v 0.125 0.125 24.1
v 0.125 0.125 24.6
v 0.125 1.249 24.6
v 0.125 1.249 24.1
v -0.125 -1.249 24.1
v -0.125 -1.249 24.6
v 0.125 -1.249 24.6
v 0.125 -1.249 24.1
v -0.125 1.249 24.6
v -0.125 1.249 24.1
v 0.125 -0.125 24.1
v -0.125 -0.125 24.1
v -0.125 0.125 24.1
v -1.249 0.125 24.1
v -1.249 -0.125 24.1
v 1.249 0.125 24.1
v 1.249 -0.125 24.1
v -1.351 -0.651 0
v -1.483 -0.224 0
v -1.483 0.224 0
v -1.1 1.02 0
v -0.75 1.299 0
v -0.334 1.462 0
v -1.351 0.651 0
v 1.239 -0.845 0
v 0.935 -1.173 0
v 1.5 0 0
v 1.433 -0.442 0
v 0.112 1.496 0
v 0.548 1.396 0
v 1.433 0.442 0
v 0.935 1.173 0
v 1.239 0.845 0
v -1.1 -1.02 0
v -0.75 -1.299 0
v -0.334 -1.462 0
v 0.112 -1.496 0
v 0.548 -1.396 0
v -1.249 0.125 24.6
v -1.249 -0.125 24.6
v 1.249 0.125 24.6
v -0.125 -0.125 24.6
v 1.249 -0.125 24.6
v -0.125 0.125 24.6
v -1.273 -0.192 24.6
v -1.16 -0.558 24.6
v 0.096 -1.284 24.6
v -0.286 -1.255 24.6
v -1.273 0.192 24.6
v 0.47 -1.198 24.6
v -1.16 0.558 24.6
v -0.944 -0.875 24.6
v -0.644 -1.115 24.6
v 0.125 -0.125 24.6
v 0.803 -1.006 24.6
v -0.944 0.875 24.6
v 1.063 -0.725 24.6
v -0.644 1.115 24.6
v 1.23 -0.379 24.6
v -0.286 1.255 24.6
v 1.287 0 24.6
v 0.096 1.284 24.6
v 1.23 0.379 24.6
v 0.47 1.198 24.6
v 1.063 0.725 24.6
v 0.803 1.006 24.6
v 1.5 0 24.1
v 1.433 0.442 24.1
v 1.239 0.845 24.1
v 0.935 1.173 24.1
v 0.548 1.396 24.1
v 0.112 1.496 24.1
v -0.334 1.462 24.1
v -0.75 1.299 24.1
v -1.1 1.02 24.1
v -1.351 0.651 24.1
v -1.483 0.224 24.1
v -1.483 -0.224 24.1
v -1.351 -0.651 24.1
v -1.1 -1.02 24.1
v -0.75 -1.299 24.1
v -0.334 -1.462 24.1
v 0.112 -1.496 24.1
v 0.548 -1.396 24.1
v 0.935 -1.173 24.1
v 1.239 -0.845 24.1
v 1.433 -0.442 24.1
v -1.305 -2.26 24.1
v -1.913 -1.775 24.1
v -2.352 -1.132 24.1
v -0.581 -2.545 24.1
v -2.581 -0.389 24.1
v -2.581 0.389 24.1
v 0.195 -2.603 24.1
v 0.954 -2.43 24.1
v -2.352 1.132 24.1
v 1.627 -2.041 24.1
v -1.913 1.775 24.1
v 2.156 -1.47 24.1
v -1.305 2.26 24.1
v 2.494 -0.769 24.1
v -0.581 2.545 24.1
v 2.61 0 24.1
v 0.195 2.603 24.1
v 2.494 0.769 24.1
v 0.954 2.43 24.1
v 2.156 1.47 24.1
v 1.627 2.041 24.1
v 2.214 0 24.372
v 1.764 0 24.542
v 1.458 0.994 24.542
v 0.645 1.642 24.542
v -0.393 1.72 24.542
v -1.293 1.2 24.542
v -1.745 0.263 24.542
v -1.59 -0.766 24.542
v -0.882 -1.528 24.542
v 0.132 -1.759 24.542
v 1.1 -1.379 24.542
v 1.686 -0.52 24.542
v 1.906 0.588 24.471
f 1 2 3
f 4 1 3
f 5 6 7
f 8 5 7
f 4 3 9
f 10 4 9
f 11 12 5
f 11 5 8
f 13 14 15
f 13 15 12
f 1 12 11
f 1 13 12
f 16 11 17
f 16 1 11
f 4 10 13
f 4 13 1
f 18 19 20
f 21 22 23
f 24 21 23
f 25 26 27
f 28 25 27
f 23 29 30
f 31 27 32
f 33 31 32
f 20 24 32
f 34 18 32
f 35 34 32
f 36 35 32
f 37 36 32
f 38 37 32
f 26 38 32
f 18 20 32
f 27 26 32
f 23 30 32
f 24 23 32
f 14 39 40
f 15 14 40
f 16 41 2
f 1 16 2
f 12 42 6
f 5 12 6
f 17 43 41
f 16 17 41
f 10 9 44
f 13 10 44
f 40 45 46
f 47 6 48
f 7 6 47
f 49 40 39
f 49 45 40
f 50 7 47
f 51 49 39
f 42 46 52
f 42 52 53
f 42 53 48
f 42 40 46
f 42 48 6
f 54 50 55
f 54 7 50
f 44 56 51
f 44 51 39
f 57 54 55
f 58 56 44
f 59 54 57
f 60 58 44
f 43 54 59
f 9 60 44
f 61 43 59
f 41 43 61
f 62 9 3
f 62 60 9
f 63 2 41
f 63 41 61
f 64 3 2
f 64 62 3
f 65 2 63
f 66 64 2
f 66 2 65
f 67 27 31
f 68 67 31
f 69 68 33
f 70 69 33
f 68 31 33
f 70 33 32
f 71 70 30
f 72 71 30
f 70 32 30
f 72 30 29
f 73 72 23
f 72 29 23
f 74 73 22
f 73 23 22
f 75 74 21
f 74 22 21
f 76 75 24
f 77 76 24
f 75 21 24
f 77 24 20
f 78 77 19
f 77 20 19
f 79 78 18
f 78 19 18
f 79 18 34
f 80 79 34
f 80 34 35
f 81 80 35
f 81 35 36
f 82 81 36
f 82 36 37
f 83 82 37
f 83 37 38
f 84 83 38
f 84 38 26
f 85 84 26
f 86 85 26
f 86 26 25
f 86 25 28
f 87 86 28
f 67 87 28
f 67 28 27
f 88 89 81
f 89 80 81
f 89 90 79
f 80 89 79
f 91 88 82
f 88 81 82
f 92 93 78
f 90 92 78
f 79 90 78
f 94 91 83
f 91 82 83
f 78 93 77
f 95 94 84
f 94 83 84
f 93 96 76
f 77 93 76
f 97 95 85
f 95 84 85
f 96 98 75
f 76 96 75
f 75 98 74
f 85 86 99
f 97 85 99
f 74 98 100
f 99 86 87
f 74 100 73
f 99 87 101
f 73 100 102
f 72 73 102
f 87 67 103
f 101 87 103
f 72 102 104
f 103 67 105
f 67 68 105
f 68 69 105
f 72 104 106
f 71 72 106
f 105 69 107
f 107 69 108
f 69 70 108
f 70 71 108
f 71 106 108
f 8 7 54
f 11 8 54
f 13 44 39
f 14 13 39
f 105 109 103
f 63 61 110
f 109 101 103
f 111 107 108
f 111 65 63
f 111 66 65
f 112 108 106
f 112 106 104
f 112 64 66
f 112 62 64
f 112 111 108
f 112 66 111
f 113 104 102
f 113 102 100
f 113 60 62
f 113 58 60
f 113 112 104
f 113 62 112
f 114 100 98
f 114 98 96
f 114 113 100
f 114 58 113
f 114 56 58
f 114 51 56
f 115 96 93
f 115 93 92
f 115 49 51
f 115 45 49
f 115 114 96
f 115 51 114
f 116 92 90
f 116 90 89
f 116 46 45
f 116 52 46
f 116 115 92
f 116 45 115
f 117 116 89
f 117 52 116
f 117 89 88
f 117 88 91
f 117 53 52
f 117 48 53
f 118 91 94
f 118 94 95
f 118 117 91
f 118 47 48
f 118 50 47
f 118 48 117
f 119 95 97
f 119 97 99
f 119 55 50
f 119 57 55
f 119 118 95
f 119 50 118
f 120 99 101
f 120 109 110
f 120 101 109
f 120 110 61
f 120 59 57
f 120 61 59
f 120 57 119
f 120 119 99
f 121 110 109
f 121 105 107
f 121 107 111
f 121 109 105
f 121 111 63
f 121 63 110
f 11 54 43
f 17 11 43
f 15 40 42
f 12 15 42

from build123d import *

# Parameters (mm, degrees)
F0_R     = 1.5
F1_DEPTH = 24.6
F2_R     = 2.61
F2_R_2   = 1.5
F3_DEPTH = 0.5
F5_DEPTH = 0.5


# Not quite as in the source:
# - a fillet or chamfer that OpenCascade refuses, or shapes differently, is made with other operations: its cross-section is extruded or revolved along the edge and cut away or added


with BuildPart() as f1:
    # F0 (on Top) → F1 (new body)
    with BuildSketch(Plane.XY):
        Circle(F0_R)
    extrude(amount=F1_DEPTH)

    # F2 (on face) → F3 (join)
    with BuildSketch(Plane.XY.offset(24.6)):
        Circle(F2_R)
        Circle(F2_R_2, mode=Mode.SUBTRACT)
    extrude(amount=-F3_DEPTH)

    # F4: fillet of radius 2 on 1 edges, made by hand

    # F4_s1 → F4_t2 (revolve, cut)
    with BuildSketch(Plane.XZ):
        with BuildLine():
            ThreePointArc((2.61, 24.1), (1.9942311257, 24.4708286934), (1.2871243445, 24.6))
            Line((1.2871243445, 24.6), (2.61, 24.6))
            Line((2.61, 24.6), (2.61, 24.1))
        make_face()
    revolve(axis=Axis((0, 0, 24.6), (0, 0, 1)), mode=Mode.SUBTRACT)

    # F2 (on face) → F5 (cut)
    with BuildSketch(Plane.XY.offset(24.6)):
        Polygon((-1.2485300168, 0.125), (-1.2485300168, -0.125), (-0.125, -0.125), (-0.125, -1.2485300168), (0.125, -1.2485300168), (0.125, -0.125), (1.2485300168, -0.125), (1.2485300168, 0.125), (0.125, 0.125), (0.125, 1.2485300168), (-0.125, 1.2485300168), (-0.125, 0.125), align=None)
    extrude(amount=-F5_DEPTH, mode=Mode.SUBTRACT)


solid = f1.part
